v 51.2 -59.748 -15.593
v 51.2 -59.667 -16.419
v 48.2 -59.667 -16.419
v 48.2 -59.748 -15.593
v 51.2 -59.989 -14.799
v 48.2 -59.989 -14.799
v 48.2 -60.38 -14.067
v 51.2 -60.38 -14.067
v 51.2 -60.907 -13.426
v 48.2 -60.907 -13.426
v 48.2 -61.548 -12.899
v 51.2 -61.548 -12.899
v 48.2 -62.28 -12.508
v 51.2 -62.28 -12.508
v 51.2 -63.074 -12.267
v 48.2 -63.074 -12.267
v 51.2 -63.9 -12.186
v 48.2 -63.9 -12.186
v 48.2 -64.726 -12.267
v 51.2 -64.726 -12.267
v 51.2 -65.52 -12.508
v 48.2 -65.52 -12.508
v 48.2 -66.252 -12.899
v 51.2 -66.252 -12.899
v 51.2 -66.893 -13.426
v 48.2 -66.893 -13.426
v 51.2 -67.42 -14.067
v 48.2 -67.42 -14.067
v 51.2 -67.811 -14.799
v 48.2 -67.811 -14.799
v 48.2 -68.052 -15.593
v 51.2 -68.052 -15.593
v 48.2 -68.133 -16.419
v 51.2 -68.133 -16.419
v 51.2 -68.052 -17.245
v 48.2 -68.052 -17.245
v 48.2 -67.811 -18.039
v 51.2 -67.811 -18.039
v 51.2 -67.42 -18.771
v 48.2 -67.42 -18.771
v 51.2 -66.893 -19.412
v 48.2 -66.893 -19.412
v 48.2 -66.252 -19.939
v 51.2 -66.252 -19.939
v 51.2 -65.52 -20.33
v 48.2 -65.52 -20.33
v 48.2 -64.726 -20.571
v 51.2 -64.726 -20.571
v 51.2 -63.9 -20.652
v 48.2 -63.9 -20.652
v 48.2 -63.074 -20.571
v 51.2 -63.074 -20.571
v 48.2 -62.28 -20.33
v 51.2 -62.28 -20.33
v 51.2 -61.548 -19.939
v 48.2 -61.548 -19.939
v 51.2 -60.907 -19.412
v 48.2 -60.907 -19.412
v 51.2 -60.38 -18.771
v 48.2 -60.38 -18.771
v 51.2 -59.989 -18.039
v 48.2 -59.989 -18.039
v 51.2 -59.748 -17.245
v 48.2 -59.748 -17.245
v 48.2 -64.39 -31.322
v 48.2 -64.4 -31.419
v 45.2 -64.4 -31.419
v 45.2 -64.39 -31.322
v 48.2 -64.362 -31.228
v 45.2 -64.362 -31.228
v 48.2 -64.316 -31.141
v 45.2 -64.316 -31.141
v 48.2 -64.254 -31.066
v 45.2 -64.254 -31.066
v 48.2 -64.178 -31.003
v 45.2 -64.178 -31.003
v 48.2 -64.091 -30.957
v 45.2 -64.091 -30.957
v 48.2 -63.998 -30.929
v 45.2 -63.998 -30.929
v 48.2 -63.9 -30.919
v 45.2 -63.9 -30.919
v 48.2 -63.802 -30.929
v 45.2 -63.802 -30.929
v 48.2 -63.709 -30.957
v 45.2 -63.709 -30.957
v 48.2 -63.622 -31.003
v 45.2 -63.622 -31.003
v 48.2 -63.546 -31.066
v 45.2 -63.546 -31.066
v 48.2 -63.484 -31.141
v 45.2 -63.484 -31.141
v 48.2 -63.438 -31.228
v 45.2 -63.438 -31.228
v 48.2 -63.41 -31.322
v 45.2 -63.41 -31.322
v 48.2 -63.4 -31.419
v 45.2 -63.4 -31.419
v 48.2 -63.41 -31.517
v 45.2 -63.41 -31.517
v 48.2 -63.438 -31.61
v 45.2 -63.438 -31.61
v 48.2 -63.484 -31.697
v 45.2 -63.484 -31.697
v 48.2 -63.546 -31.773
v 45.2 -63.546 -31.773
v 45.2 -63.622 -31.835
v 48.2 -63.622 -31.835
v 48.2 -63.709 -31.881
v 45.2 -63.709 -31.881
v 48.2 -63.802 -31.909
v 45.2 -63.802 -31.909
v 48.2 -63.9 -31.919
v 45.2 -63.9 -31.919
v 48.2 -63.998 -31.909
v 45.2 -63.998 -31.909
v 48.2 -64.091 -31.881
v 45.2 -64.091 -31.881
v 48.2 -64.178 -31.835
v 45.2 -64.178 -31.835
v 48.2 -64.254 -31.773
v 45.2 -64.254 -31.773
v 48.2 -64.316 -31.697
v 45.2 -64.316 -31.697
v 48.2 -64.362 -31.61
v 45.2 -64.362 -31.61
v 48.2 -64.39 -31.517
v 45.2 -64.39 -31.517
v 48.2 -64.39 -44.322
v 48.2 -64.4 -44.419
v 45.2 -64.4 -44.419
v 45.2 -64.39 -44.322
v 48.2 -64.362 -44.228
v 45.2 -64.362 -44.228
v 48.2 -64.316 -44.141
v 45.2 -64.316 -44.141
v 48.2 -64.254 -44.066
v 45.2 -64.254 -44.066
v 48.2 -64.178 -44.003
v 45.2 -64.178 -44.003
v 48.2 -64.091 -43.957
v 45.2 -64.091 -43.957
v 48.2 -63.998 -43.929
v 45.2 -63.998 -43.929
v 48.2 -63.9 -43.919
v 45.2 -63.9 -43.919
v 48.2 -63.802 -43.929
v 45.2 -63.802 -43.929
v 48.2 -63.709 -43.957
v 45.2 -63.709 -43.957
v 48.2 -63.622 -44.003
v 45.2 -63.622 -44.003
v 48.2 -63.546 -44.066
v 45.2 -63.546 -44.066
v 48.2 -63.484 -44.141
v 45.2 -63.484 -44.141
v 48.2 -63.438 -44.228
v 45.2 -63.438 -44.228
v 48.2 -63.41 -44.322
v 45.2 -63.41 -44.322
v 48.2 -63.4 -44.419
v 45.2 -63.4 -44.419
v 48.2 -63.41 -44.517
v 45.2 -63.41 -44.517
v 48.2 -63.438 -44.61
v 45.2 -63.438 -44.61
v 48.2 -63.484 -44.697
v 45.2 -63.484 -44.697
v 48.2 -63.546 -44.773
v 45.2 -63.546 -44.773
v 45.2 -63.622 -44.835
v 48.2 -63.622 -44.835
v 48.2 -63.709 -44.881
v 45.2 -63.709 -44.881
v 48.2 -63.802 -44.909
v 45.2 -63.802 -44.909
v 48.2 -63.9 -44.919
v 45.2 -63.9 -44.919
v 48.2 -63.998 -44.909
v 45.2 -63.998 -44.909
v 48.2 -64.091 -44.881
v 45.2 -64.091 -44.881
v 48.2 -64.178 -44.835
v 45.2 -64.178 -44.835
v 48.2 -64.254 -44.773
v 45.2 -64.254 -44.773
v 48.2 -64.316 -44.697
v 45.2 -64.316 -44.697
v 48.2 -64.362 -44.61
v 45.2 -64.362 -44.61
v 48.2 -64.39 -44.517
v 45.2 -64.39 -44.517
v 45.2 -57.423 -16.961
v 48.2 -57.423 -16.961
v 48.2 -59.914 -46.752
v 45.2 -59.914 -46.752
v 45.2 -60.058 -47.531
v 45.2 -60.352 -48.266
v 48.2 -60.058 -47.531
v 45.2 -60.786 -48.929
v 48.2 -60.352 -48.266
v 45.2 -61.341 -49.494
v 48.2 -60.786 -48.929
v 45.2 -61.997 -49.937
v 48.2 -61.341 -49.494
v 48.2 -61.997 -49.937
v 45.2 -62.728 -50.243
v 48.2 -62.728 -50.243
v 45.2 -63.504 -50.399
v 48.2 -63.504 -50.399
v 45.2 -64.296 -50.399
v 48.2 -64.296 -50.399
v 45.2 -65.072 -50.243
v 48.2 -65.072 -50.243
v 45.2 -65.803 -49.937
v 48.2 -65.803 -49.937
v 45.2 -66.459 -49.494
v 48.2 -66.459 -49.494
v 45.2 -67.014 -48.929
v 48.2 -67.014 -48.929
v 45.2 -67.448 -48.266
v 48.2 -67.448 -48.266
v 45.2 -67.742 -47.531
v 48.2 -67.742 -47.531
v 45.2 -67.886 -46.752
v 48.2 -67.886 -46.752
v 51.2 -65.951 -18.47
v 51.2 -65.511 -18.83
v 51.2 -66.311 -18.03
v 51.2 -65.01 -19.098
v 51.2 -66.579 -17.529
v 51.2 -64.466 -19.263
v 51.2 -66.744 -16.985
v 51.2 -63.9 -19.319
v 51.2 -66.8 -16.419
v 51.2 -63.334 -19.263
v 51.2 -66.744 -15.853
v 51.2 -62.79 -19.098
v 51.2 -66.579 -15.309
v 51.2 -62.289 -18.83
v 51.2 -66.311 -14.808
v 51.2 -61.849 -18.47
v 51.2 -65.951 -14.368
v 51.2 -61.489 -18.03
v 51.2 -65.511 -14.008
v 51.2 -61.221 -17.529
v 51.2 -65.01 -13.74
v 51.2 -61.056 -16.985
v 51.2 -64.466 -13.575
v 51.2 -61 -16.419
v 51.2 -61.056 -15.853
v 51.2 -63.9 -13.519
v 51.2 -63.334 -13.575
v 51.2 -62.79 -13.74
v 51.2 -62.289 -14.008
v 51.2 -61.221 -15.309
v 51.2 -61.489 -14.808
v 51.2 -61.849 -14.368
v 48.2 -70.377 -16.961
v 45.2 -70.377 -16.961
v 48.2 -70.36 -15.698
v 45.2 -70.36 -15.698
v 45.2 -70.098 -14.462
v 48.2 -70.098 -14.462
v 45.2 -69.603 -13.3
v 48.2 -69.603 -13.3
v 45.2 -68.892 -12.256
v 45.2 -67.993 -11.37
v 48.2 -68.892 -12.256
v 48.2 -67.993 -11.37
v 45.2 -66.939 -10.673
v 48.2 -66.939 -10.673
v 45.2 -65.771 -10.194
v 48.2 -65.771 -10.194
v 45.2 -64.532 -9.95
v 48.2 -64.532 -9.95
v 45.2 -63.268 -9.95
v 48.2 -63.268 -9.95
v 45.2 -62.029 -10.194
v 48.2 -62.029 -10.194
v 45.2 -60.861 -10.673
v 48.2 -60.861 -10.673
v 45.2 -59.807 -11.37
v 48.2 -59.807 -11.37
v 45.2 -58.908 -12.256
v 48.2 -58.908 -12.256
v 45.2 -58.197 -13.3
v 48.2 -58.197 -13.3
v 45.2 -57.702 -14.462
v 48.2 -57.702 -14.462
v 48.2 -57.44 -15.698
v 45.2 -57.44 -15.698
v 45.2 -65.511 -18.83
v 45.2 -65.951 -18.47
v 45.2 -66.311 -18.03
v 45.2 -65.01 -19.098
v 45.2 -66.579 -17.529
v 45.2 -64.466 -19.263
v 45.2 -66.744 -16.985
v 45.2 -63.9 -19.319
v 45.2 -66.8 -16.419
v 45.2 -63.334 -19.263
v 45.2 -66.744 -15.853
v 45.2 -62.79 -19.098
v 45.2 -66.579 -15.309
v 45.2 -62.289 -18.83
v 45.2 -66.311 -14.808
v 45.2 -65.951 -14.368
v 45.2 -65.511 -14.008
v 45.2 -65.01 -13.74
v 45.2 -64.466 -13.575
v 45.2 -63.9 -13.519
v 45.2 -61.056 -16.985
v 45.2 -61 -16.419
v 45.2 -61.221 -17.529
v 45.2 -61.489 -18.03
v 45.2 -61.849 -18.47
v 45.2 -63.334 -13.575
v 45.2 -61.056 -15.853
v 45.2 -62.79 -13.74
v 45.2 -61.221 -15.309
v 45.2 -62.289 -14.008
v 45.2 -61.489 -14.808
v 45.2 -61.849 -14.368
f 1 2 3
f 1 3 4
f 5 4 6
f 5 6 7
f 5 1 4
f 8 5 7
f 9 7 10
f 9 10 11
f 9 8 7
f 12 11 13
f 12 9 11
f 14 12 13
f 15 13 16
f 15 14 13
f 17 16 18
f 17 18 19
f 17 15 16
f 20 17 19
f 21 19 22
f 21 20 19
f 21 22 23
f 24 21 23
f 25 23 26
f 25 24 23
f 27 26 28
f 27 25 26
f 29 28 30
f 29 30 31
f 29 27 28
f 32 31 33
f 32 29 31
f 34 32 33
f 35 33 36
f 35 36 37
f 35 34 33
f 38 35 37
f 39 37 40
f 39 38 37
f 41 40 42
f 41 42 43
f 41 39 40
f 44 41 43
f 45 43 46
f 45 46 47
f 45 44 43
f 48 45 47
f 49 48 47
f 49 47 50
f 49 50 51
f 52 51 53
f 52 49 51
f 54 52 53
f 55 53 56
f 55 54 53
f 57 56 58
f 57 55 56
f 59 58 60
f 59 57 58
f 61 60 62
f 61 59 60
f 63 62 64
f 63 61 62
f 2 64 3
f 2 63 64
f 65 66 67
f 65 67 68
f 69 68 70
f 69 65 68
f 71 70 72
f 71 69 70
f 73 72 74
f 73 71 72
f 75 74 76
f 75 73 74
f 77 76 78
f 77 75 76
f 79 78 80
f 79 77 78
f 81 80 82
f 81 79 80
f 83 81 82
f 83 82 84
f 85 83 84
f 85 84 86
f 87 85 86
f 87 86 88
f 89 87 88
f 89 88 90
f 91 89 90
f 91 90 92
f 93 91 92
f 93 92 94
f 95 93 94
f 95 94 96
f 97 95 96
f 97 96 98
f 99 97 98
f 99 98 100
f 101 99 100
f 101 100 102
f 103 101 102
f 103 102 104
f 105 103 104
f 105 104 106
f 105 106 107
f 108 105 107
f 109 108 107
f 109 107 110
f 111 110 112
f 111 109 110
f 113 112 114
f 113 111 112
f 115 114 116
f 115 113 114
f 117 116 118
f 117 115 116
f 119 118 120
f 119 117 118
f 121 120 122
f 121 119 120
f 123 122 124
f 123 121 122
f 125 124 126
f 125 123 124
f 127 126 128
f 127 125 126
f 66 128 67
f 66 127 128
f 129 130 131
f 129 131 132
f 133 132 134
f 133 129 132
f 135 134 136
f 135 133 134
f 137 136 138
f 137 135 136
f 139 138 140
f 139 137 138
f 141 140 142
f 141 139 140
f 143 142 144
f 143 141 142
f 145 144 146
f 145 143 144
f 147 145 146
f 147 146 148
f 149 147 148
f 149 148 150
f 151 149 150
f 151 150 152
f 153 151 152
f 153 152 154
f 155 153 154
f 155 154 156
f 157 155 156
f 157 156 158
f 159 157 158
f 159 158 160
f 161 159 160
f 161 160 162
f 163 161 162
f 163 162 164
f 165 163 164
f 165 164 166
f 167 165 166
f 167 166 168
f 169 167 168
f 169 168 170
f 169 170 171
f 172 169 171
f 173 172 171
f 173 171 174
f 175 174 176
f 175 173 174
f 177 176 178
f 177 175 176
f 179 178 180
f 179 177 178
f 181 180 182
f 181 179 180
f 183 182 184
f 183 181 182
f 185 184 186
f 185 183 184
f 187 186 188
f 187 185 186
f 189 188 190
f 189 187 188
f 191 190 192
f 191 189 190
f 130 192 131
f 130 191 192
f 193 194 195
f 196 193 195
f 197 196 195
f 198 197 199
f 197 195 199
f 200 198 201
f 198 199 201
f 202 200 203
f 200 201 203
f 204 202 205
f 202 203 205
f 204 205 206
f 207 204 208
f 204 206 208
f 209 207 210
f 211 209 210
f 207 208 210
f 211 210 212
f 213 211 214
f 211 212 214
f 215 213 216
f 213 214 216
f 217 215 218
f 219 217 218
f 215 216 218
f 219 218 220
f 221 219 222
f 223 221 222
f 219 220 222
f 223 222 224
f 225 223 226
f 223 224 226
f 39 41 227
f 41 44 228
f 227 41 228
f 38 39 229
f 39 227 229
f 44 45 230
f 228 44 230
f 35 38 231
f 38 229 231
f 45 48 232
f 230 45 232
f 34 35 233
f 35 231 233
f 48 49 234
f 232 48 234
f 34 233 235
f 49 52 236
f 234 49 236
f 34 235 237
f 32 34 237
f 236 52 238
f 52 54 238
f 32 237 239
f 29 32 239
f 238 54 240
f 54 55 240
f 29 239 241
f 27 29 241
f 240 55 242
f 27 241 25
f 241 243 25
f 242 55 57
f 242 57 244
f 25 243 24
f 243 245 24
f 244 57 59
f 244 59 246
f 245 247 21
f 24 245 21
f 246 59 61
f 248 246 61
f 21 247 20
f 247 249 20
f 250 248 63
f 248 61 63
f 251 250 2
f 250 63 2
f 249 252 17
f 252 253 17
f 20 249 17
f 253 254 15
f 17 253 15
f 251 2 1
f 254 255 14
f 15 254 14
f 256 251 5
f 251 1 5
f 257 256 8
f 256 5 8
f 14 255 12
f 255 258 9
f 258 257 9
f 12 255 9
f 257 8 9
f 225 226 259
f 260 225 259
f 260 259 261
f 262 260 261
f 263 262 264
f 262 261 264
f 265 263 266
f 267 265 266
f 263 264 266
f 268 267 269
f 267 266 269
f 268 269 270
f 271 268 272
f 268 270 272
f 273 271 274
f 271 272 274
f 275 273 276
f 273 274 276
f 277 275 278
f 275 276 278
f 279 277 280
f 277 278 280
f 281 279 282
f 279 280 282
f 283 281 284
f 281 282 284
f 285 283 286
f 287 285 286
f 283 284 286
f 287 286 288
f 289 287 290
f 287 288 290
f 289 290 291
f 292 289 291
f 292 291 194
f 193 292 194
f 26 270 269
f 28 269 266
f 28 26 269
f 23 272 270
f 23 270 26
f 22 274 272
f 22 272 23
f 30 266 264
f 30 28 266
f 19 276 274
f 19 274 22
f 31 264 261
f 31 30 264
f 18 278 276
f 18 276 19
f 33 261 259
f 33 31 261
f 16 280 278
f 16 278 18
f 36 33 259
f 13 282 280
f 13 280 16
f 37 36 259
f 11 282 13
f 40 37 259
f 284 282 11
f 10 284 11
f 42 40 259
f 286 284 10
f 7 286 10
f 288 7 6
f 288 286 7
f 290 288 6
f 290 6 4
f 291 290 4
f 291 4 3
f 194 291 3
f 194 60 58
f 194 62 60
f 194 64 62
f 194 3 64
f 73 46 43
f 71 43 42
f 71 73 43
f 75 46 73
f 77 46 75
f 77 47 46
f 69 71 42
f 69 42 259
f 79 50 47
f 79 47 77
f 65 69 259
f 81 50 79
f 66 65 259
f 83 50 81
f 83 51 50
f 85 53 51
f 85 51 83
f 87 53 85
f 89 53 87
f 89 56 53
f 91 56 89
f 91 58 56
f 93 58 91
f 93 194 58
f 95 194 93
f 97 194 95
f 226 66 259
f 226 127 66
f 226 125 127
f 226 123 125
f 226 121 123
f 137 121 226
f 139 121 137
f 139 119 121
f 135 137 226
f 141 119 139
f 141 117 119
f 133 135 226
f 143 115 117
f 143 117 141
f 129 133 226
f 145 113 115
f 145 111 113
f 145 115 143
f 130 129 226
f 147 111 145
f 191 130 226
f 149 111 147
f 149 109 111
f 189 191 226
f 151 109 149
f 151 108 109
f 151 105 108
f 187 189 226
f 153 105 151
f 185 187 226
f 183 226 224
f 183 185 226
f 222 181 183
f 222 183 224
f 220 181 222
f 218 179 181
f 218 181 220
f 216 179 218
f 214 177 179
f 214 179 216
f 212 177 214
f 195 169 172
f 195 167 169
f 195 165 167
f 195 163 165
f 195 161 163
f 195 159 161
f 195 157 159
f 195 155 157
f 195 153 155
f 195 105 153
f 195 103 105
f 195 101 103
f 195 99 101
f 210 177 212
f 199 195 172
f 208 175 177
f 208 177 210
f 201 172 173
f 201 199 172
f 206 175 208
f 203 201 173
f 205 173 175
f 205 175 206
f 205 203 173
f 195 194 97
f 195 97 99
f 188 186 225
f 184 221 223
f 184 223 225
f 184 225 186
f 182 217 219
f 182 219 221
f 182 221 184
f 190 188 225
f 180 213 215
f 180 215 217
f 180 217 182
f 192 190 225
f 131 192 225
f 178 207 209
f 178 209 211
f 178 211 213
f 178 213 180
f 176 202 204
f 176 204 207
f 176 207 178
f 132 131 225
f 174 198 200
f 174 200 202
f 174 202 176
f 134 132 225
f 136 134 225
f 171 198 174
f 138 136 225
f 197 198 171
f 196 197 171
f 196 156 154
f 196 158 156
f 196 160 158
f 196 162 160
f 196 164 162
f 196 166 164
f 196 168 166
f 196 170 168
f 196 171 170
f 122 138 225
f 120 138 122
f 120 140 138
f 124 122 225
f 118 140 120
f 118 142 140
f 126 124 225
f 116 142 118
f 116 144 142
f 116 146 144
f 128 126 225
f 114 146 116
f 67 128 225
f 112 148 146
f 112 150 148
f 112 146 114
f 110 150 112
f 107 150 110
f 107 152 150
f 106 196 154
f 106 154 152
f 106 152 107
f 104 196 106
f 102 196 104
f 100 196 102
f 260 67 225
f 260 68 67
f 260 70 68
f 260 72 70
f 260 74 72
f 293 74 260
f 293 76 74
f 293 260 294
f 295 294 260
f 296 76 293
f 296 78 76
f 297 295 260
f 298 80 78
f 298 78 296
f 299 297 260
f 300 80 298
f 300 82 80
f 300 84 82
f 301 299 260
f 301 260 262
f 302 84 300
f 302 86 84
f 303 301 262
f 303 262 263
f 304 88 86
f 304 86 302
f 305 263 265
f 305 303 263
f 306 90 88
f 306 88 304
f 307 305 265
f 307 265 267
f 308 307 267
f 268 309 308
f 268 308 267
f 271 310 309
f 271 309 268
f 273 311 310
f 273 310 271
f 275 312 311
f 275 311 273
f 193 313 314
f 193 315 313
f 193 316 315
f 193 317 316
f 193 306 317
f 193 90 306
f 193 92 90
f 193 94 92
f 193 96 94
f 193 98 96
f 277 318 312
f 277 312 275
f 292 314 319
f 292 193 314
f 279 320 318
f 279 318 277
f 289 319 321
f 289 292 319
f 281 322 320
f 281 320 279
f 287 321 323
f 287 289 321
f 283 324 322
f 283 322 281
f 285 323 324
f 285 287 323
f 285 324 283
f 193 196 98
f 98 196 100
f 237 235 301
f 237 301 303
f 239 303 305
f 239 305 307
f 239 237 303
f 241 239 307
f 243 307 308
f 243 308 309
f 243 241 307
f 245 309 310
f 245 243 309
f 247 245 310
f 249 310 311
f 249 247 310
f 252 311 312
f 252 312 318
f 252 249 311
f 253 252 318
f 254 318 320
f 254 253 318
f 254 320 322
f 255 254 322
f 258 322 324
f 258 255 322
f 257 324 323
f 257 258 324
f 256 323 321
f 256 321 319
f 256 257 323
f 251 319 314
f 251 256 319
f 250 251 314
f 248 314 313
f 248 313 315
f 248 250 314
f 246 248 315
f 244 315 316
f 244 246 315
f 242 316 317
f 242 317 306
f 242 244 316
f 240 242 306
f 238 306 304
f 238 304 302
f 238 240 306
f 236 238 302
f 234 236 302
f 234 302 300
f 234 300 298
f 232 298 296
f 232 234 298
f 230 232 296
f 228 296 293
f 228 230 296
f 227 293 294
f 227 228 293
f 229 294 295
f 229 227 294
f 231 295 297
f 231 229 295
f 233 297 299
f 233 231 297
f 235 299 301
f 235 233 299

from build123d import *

# Parameters (mm, degrees)
ESQUISSE1_R             = 2.9
ESQUISSE1_R_2           = 0.5
BOSS_EXTRU_1_DEPTH      = 6
ESQUISSE2_R             = 4.232956527
ENL_V_MAT_EXTRU_1_DEPTH = 3


with BuildPart() as part:
    # Esquisse1 → Boss.-Extru.1 (new body)
    with BuildSketch(Plane.ZY.offset(-51.2)):
        with BuildLine():
            Line((-16.960725558, -57.422608764), (-46.752392225, -59.913913086))
            ThreePointArc((-46.752392225, -59.913913086), (-50.419058892, -63.9), (-46.752392225, -67.886086914))
            Line((-46.752392225, -67.886086914), (-16.960725558, -70.377391236))
            ThreePointArc((-16.960725558, -70.377391236), (-9.919058892, -63.9), (-16.960725558, -57.422608764))
        make_face()
        with Locations(Location((-16.419058892, -63.9, 0), (0, 0, 270))):
            Circle(ESQUISSE1_R, mode=Mode.SUBTRACT)
        with Locations(Location((-31.419058892, -63.9, 0), (0, 0, 270))):
            Circle(ESQUISSE1_R_2, mode=Mode.SUBTRACT)
        with Locations(Location((-44.419058892, -63.9, 0), (0, 0, 270))):
            Circle(ESQUISSE1_R_2, mode=Mode.SUBTRACT)
    extrude(amount=BOSS_EXTRU_1_DEPTH)

    # Esquisse2 → Enlèv. mat.-Extru.1 (cut)
    with BuildSketch(Plane(origin=(51.2, 0, 0), x_dir=(0, 0, -1), z_dir=(1, 0, 0))):
        with BuildLine():
            Line((16.960725558, -70.377391236), (46.752392225, -67.886086914))
            ThreePointArc((46.752392225, -67.886086914), (50.419058892, -63.9), (46.752392225, -59.913913086))
            Line((46.752392225, -59.913913086), (16.960725558, -57.422608764))
            ThreePointArc((16.960725558, -57.422608764), (9.919058892, -63.9), (16.960725558, -70.377391236))
        make_face()
        with Locations(Location((16.419058892, -63.9, 0), (0, 0, 90))):
            Circle(ESQUISSE2_R, mode=Mode.SUBTRACT)
    extrude(amount=-ENL_V_MAT_EXTRU_1_DEPTH, mode=Mode.SUBTRACT)


solid = part.part
